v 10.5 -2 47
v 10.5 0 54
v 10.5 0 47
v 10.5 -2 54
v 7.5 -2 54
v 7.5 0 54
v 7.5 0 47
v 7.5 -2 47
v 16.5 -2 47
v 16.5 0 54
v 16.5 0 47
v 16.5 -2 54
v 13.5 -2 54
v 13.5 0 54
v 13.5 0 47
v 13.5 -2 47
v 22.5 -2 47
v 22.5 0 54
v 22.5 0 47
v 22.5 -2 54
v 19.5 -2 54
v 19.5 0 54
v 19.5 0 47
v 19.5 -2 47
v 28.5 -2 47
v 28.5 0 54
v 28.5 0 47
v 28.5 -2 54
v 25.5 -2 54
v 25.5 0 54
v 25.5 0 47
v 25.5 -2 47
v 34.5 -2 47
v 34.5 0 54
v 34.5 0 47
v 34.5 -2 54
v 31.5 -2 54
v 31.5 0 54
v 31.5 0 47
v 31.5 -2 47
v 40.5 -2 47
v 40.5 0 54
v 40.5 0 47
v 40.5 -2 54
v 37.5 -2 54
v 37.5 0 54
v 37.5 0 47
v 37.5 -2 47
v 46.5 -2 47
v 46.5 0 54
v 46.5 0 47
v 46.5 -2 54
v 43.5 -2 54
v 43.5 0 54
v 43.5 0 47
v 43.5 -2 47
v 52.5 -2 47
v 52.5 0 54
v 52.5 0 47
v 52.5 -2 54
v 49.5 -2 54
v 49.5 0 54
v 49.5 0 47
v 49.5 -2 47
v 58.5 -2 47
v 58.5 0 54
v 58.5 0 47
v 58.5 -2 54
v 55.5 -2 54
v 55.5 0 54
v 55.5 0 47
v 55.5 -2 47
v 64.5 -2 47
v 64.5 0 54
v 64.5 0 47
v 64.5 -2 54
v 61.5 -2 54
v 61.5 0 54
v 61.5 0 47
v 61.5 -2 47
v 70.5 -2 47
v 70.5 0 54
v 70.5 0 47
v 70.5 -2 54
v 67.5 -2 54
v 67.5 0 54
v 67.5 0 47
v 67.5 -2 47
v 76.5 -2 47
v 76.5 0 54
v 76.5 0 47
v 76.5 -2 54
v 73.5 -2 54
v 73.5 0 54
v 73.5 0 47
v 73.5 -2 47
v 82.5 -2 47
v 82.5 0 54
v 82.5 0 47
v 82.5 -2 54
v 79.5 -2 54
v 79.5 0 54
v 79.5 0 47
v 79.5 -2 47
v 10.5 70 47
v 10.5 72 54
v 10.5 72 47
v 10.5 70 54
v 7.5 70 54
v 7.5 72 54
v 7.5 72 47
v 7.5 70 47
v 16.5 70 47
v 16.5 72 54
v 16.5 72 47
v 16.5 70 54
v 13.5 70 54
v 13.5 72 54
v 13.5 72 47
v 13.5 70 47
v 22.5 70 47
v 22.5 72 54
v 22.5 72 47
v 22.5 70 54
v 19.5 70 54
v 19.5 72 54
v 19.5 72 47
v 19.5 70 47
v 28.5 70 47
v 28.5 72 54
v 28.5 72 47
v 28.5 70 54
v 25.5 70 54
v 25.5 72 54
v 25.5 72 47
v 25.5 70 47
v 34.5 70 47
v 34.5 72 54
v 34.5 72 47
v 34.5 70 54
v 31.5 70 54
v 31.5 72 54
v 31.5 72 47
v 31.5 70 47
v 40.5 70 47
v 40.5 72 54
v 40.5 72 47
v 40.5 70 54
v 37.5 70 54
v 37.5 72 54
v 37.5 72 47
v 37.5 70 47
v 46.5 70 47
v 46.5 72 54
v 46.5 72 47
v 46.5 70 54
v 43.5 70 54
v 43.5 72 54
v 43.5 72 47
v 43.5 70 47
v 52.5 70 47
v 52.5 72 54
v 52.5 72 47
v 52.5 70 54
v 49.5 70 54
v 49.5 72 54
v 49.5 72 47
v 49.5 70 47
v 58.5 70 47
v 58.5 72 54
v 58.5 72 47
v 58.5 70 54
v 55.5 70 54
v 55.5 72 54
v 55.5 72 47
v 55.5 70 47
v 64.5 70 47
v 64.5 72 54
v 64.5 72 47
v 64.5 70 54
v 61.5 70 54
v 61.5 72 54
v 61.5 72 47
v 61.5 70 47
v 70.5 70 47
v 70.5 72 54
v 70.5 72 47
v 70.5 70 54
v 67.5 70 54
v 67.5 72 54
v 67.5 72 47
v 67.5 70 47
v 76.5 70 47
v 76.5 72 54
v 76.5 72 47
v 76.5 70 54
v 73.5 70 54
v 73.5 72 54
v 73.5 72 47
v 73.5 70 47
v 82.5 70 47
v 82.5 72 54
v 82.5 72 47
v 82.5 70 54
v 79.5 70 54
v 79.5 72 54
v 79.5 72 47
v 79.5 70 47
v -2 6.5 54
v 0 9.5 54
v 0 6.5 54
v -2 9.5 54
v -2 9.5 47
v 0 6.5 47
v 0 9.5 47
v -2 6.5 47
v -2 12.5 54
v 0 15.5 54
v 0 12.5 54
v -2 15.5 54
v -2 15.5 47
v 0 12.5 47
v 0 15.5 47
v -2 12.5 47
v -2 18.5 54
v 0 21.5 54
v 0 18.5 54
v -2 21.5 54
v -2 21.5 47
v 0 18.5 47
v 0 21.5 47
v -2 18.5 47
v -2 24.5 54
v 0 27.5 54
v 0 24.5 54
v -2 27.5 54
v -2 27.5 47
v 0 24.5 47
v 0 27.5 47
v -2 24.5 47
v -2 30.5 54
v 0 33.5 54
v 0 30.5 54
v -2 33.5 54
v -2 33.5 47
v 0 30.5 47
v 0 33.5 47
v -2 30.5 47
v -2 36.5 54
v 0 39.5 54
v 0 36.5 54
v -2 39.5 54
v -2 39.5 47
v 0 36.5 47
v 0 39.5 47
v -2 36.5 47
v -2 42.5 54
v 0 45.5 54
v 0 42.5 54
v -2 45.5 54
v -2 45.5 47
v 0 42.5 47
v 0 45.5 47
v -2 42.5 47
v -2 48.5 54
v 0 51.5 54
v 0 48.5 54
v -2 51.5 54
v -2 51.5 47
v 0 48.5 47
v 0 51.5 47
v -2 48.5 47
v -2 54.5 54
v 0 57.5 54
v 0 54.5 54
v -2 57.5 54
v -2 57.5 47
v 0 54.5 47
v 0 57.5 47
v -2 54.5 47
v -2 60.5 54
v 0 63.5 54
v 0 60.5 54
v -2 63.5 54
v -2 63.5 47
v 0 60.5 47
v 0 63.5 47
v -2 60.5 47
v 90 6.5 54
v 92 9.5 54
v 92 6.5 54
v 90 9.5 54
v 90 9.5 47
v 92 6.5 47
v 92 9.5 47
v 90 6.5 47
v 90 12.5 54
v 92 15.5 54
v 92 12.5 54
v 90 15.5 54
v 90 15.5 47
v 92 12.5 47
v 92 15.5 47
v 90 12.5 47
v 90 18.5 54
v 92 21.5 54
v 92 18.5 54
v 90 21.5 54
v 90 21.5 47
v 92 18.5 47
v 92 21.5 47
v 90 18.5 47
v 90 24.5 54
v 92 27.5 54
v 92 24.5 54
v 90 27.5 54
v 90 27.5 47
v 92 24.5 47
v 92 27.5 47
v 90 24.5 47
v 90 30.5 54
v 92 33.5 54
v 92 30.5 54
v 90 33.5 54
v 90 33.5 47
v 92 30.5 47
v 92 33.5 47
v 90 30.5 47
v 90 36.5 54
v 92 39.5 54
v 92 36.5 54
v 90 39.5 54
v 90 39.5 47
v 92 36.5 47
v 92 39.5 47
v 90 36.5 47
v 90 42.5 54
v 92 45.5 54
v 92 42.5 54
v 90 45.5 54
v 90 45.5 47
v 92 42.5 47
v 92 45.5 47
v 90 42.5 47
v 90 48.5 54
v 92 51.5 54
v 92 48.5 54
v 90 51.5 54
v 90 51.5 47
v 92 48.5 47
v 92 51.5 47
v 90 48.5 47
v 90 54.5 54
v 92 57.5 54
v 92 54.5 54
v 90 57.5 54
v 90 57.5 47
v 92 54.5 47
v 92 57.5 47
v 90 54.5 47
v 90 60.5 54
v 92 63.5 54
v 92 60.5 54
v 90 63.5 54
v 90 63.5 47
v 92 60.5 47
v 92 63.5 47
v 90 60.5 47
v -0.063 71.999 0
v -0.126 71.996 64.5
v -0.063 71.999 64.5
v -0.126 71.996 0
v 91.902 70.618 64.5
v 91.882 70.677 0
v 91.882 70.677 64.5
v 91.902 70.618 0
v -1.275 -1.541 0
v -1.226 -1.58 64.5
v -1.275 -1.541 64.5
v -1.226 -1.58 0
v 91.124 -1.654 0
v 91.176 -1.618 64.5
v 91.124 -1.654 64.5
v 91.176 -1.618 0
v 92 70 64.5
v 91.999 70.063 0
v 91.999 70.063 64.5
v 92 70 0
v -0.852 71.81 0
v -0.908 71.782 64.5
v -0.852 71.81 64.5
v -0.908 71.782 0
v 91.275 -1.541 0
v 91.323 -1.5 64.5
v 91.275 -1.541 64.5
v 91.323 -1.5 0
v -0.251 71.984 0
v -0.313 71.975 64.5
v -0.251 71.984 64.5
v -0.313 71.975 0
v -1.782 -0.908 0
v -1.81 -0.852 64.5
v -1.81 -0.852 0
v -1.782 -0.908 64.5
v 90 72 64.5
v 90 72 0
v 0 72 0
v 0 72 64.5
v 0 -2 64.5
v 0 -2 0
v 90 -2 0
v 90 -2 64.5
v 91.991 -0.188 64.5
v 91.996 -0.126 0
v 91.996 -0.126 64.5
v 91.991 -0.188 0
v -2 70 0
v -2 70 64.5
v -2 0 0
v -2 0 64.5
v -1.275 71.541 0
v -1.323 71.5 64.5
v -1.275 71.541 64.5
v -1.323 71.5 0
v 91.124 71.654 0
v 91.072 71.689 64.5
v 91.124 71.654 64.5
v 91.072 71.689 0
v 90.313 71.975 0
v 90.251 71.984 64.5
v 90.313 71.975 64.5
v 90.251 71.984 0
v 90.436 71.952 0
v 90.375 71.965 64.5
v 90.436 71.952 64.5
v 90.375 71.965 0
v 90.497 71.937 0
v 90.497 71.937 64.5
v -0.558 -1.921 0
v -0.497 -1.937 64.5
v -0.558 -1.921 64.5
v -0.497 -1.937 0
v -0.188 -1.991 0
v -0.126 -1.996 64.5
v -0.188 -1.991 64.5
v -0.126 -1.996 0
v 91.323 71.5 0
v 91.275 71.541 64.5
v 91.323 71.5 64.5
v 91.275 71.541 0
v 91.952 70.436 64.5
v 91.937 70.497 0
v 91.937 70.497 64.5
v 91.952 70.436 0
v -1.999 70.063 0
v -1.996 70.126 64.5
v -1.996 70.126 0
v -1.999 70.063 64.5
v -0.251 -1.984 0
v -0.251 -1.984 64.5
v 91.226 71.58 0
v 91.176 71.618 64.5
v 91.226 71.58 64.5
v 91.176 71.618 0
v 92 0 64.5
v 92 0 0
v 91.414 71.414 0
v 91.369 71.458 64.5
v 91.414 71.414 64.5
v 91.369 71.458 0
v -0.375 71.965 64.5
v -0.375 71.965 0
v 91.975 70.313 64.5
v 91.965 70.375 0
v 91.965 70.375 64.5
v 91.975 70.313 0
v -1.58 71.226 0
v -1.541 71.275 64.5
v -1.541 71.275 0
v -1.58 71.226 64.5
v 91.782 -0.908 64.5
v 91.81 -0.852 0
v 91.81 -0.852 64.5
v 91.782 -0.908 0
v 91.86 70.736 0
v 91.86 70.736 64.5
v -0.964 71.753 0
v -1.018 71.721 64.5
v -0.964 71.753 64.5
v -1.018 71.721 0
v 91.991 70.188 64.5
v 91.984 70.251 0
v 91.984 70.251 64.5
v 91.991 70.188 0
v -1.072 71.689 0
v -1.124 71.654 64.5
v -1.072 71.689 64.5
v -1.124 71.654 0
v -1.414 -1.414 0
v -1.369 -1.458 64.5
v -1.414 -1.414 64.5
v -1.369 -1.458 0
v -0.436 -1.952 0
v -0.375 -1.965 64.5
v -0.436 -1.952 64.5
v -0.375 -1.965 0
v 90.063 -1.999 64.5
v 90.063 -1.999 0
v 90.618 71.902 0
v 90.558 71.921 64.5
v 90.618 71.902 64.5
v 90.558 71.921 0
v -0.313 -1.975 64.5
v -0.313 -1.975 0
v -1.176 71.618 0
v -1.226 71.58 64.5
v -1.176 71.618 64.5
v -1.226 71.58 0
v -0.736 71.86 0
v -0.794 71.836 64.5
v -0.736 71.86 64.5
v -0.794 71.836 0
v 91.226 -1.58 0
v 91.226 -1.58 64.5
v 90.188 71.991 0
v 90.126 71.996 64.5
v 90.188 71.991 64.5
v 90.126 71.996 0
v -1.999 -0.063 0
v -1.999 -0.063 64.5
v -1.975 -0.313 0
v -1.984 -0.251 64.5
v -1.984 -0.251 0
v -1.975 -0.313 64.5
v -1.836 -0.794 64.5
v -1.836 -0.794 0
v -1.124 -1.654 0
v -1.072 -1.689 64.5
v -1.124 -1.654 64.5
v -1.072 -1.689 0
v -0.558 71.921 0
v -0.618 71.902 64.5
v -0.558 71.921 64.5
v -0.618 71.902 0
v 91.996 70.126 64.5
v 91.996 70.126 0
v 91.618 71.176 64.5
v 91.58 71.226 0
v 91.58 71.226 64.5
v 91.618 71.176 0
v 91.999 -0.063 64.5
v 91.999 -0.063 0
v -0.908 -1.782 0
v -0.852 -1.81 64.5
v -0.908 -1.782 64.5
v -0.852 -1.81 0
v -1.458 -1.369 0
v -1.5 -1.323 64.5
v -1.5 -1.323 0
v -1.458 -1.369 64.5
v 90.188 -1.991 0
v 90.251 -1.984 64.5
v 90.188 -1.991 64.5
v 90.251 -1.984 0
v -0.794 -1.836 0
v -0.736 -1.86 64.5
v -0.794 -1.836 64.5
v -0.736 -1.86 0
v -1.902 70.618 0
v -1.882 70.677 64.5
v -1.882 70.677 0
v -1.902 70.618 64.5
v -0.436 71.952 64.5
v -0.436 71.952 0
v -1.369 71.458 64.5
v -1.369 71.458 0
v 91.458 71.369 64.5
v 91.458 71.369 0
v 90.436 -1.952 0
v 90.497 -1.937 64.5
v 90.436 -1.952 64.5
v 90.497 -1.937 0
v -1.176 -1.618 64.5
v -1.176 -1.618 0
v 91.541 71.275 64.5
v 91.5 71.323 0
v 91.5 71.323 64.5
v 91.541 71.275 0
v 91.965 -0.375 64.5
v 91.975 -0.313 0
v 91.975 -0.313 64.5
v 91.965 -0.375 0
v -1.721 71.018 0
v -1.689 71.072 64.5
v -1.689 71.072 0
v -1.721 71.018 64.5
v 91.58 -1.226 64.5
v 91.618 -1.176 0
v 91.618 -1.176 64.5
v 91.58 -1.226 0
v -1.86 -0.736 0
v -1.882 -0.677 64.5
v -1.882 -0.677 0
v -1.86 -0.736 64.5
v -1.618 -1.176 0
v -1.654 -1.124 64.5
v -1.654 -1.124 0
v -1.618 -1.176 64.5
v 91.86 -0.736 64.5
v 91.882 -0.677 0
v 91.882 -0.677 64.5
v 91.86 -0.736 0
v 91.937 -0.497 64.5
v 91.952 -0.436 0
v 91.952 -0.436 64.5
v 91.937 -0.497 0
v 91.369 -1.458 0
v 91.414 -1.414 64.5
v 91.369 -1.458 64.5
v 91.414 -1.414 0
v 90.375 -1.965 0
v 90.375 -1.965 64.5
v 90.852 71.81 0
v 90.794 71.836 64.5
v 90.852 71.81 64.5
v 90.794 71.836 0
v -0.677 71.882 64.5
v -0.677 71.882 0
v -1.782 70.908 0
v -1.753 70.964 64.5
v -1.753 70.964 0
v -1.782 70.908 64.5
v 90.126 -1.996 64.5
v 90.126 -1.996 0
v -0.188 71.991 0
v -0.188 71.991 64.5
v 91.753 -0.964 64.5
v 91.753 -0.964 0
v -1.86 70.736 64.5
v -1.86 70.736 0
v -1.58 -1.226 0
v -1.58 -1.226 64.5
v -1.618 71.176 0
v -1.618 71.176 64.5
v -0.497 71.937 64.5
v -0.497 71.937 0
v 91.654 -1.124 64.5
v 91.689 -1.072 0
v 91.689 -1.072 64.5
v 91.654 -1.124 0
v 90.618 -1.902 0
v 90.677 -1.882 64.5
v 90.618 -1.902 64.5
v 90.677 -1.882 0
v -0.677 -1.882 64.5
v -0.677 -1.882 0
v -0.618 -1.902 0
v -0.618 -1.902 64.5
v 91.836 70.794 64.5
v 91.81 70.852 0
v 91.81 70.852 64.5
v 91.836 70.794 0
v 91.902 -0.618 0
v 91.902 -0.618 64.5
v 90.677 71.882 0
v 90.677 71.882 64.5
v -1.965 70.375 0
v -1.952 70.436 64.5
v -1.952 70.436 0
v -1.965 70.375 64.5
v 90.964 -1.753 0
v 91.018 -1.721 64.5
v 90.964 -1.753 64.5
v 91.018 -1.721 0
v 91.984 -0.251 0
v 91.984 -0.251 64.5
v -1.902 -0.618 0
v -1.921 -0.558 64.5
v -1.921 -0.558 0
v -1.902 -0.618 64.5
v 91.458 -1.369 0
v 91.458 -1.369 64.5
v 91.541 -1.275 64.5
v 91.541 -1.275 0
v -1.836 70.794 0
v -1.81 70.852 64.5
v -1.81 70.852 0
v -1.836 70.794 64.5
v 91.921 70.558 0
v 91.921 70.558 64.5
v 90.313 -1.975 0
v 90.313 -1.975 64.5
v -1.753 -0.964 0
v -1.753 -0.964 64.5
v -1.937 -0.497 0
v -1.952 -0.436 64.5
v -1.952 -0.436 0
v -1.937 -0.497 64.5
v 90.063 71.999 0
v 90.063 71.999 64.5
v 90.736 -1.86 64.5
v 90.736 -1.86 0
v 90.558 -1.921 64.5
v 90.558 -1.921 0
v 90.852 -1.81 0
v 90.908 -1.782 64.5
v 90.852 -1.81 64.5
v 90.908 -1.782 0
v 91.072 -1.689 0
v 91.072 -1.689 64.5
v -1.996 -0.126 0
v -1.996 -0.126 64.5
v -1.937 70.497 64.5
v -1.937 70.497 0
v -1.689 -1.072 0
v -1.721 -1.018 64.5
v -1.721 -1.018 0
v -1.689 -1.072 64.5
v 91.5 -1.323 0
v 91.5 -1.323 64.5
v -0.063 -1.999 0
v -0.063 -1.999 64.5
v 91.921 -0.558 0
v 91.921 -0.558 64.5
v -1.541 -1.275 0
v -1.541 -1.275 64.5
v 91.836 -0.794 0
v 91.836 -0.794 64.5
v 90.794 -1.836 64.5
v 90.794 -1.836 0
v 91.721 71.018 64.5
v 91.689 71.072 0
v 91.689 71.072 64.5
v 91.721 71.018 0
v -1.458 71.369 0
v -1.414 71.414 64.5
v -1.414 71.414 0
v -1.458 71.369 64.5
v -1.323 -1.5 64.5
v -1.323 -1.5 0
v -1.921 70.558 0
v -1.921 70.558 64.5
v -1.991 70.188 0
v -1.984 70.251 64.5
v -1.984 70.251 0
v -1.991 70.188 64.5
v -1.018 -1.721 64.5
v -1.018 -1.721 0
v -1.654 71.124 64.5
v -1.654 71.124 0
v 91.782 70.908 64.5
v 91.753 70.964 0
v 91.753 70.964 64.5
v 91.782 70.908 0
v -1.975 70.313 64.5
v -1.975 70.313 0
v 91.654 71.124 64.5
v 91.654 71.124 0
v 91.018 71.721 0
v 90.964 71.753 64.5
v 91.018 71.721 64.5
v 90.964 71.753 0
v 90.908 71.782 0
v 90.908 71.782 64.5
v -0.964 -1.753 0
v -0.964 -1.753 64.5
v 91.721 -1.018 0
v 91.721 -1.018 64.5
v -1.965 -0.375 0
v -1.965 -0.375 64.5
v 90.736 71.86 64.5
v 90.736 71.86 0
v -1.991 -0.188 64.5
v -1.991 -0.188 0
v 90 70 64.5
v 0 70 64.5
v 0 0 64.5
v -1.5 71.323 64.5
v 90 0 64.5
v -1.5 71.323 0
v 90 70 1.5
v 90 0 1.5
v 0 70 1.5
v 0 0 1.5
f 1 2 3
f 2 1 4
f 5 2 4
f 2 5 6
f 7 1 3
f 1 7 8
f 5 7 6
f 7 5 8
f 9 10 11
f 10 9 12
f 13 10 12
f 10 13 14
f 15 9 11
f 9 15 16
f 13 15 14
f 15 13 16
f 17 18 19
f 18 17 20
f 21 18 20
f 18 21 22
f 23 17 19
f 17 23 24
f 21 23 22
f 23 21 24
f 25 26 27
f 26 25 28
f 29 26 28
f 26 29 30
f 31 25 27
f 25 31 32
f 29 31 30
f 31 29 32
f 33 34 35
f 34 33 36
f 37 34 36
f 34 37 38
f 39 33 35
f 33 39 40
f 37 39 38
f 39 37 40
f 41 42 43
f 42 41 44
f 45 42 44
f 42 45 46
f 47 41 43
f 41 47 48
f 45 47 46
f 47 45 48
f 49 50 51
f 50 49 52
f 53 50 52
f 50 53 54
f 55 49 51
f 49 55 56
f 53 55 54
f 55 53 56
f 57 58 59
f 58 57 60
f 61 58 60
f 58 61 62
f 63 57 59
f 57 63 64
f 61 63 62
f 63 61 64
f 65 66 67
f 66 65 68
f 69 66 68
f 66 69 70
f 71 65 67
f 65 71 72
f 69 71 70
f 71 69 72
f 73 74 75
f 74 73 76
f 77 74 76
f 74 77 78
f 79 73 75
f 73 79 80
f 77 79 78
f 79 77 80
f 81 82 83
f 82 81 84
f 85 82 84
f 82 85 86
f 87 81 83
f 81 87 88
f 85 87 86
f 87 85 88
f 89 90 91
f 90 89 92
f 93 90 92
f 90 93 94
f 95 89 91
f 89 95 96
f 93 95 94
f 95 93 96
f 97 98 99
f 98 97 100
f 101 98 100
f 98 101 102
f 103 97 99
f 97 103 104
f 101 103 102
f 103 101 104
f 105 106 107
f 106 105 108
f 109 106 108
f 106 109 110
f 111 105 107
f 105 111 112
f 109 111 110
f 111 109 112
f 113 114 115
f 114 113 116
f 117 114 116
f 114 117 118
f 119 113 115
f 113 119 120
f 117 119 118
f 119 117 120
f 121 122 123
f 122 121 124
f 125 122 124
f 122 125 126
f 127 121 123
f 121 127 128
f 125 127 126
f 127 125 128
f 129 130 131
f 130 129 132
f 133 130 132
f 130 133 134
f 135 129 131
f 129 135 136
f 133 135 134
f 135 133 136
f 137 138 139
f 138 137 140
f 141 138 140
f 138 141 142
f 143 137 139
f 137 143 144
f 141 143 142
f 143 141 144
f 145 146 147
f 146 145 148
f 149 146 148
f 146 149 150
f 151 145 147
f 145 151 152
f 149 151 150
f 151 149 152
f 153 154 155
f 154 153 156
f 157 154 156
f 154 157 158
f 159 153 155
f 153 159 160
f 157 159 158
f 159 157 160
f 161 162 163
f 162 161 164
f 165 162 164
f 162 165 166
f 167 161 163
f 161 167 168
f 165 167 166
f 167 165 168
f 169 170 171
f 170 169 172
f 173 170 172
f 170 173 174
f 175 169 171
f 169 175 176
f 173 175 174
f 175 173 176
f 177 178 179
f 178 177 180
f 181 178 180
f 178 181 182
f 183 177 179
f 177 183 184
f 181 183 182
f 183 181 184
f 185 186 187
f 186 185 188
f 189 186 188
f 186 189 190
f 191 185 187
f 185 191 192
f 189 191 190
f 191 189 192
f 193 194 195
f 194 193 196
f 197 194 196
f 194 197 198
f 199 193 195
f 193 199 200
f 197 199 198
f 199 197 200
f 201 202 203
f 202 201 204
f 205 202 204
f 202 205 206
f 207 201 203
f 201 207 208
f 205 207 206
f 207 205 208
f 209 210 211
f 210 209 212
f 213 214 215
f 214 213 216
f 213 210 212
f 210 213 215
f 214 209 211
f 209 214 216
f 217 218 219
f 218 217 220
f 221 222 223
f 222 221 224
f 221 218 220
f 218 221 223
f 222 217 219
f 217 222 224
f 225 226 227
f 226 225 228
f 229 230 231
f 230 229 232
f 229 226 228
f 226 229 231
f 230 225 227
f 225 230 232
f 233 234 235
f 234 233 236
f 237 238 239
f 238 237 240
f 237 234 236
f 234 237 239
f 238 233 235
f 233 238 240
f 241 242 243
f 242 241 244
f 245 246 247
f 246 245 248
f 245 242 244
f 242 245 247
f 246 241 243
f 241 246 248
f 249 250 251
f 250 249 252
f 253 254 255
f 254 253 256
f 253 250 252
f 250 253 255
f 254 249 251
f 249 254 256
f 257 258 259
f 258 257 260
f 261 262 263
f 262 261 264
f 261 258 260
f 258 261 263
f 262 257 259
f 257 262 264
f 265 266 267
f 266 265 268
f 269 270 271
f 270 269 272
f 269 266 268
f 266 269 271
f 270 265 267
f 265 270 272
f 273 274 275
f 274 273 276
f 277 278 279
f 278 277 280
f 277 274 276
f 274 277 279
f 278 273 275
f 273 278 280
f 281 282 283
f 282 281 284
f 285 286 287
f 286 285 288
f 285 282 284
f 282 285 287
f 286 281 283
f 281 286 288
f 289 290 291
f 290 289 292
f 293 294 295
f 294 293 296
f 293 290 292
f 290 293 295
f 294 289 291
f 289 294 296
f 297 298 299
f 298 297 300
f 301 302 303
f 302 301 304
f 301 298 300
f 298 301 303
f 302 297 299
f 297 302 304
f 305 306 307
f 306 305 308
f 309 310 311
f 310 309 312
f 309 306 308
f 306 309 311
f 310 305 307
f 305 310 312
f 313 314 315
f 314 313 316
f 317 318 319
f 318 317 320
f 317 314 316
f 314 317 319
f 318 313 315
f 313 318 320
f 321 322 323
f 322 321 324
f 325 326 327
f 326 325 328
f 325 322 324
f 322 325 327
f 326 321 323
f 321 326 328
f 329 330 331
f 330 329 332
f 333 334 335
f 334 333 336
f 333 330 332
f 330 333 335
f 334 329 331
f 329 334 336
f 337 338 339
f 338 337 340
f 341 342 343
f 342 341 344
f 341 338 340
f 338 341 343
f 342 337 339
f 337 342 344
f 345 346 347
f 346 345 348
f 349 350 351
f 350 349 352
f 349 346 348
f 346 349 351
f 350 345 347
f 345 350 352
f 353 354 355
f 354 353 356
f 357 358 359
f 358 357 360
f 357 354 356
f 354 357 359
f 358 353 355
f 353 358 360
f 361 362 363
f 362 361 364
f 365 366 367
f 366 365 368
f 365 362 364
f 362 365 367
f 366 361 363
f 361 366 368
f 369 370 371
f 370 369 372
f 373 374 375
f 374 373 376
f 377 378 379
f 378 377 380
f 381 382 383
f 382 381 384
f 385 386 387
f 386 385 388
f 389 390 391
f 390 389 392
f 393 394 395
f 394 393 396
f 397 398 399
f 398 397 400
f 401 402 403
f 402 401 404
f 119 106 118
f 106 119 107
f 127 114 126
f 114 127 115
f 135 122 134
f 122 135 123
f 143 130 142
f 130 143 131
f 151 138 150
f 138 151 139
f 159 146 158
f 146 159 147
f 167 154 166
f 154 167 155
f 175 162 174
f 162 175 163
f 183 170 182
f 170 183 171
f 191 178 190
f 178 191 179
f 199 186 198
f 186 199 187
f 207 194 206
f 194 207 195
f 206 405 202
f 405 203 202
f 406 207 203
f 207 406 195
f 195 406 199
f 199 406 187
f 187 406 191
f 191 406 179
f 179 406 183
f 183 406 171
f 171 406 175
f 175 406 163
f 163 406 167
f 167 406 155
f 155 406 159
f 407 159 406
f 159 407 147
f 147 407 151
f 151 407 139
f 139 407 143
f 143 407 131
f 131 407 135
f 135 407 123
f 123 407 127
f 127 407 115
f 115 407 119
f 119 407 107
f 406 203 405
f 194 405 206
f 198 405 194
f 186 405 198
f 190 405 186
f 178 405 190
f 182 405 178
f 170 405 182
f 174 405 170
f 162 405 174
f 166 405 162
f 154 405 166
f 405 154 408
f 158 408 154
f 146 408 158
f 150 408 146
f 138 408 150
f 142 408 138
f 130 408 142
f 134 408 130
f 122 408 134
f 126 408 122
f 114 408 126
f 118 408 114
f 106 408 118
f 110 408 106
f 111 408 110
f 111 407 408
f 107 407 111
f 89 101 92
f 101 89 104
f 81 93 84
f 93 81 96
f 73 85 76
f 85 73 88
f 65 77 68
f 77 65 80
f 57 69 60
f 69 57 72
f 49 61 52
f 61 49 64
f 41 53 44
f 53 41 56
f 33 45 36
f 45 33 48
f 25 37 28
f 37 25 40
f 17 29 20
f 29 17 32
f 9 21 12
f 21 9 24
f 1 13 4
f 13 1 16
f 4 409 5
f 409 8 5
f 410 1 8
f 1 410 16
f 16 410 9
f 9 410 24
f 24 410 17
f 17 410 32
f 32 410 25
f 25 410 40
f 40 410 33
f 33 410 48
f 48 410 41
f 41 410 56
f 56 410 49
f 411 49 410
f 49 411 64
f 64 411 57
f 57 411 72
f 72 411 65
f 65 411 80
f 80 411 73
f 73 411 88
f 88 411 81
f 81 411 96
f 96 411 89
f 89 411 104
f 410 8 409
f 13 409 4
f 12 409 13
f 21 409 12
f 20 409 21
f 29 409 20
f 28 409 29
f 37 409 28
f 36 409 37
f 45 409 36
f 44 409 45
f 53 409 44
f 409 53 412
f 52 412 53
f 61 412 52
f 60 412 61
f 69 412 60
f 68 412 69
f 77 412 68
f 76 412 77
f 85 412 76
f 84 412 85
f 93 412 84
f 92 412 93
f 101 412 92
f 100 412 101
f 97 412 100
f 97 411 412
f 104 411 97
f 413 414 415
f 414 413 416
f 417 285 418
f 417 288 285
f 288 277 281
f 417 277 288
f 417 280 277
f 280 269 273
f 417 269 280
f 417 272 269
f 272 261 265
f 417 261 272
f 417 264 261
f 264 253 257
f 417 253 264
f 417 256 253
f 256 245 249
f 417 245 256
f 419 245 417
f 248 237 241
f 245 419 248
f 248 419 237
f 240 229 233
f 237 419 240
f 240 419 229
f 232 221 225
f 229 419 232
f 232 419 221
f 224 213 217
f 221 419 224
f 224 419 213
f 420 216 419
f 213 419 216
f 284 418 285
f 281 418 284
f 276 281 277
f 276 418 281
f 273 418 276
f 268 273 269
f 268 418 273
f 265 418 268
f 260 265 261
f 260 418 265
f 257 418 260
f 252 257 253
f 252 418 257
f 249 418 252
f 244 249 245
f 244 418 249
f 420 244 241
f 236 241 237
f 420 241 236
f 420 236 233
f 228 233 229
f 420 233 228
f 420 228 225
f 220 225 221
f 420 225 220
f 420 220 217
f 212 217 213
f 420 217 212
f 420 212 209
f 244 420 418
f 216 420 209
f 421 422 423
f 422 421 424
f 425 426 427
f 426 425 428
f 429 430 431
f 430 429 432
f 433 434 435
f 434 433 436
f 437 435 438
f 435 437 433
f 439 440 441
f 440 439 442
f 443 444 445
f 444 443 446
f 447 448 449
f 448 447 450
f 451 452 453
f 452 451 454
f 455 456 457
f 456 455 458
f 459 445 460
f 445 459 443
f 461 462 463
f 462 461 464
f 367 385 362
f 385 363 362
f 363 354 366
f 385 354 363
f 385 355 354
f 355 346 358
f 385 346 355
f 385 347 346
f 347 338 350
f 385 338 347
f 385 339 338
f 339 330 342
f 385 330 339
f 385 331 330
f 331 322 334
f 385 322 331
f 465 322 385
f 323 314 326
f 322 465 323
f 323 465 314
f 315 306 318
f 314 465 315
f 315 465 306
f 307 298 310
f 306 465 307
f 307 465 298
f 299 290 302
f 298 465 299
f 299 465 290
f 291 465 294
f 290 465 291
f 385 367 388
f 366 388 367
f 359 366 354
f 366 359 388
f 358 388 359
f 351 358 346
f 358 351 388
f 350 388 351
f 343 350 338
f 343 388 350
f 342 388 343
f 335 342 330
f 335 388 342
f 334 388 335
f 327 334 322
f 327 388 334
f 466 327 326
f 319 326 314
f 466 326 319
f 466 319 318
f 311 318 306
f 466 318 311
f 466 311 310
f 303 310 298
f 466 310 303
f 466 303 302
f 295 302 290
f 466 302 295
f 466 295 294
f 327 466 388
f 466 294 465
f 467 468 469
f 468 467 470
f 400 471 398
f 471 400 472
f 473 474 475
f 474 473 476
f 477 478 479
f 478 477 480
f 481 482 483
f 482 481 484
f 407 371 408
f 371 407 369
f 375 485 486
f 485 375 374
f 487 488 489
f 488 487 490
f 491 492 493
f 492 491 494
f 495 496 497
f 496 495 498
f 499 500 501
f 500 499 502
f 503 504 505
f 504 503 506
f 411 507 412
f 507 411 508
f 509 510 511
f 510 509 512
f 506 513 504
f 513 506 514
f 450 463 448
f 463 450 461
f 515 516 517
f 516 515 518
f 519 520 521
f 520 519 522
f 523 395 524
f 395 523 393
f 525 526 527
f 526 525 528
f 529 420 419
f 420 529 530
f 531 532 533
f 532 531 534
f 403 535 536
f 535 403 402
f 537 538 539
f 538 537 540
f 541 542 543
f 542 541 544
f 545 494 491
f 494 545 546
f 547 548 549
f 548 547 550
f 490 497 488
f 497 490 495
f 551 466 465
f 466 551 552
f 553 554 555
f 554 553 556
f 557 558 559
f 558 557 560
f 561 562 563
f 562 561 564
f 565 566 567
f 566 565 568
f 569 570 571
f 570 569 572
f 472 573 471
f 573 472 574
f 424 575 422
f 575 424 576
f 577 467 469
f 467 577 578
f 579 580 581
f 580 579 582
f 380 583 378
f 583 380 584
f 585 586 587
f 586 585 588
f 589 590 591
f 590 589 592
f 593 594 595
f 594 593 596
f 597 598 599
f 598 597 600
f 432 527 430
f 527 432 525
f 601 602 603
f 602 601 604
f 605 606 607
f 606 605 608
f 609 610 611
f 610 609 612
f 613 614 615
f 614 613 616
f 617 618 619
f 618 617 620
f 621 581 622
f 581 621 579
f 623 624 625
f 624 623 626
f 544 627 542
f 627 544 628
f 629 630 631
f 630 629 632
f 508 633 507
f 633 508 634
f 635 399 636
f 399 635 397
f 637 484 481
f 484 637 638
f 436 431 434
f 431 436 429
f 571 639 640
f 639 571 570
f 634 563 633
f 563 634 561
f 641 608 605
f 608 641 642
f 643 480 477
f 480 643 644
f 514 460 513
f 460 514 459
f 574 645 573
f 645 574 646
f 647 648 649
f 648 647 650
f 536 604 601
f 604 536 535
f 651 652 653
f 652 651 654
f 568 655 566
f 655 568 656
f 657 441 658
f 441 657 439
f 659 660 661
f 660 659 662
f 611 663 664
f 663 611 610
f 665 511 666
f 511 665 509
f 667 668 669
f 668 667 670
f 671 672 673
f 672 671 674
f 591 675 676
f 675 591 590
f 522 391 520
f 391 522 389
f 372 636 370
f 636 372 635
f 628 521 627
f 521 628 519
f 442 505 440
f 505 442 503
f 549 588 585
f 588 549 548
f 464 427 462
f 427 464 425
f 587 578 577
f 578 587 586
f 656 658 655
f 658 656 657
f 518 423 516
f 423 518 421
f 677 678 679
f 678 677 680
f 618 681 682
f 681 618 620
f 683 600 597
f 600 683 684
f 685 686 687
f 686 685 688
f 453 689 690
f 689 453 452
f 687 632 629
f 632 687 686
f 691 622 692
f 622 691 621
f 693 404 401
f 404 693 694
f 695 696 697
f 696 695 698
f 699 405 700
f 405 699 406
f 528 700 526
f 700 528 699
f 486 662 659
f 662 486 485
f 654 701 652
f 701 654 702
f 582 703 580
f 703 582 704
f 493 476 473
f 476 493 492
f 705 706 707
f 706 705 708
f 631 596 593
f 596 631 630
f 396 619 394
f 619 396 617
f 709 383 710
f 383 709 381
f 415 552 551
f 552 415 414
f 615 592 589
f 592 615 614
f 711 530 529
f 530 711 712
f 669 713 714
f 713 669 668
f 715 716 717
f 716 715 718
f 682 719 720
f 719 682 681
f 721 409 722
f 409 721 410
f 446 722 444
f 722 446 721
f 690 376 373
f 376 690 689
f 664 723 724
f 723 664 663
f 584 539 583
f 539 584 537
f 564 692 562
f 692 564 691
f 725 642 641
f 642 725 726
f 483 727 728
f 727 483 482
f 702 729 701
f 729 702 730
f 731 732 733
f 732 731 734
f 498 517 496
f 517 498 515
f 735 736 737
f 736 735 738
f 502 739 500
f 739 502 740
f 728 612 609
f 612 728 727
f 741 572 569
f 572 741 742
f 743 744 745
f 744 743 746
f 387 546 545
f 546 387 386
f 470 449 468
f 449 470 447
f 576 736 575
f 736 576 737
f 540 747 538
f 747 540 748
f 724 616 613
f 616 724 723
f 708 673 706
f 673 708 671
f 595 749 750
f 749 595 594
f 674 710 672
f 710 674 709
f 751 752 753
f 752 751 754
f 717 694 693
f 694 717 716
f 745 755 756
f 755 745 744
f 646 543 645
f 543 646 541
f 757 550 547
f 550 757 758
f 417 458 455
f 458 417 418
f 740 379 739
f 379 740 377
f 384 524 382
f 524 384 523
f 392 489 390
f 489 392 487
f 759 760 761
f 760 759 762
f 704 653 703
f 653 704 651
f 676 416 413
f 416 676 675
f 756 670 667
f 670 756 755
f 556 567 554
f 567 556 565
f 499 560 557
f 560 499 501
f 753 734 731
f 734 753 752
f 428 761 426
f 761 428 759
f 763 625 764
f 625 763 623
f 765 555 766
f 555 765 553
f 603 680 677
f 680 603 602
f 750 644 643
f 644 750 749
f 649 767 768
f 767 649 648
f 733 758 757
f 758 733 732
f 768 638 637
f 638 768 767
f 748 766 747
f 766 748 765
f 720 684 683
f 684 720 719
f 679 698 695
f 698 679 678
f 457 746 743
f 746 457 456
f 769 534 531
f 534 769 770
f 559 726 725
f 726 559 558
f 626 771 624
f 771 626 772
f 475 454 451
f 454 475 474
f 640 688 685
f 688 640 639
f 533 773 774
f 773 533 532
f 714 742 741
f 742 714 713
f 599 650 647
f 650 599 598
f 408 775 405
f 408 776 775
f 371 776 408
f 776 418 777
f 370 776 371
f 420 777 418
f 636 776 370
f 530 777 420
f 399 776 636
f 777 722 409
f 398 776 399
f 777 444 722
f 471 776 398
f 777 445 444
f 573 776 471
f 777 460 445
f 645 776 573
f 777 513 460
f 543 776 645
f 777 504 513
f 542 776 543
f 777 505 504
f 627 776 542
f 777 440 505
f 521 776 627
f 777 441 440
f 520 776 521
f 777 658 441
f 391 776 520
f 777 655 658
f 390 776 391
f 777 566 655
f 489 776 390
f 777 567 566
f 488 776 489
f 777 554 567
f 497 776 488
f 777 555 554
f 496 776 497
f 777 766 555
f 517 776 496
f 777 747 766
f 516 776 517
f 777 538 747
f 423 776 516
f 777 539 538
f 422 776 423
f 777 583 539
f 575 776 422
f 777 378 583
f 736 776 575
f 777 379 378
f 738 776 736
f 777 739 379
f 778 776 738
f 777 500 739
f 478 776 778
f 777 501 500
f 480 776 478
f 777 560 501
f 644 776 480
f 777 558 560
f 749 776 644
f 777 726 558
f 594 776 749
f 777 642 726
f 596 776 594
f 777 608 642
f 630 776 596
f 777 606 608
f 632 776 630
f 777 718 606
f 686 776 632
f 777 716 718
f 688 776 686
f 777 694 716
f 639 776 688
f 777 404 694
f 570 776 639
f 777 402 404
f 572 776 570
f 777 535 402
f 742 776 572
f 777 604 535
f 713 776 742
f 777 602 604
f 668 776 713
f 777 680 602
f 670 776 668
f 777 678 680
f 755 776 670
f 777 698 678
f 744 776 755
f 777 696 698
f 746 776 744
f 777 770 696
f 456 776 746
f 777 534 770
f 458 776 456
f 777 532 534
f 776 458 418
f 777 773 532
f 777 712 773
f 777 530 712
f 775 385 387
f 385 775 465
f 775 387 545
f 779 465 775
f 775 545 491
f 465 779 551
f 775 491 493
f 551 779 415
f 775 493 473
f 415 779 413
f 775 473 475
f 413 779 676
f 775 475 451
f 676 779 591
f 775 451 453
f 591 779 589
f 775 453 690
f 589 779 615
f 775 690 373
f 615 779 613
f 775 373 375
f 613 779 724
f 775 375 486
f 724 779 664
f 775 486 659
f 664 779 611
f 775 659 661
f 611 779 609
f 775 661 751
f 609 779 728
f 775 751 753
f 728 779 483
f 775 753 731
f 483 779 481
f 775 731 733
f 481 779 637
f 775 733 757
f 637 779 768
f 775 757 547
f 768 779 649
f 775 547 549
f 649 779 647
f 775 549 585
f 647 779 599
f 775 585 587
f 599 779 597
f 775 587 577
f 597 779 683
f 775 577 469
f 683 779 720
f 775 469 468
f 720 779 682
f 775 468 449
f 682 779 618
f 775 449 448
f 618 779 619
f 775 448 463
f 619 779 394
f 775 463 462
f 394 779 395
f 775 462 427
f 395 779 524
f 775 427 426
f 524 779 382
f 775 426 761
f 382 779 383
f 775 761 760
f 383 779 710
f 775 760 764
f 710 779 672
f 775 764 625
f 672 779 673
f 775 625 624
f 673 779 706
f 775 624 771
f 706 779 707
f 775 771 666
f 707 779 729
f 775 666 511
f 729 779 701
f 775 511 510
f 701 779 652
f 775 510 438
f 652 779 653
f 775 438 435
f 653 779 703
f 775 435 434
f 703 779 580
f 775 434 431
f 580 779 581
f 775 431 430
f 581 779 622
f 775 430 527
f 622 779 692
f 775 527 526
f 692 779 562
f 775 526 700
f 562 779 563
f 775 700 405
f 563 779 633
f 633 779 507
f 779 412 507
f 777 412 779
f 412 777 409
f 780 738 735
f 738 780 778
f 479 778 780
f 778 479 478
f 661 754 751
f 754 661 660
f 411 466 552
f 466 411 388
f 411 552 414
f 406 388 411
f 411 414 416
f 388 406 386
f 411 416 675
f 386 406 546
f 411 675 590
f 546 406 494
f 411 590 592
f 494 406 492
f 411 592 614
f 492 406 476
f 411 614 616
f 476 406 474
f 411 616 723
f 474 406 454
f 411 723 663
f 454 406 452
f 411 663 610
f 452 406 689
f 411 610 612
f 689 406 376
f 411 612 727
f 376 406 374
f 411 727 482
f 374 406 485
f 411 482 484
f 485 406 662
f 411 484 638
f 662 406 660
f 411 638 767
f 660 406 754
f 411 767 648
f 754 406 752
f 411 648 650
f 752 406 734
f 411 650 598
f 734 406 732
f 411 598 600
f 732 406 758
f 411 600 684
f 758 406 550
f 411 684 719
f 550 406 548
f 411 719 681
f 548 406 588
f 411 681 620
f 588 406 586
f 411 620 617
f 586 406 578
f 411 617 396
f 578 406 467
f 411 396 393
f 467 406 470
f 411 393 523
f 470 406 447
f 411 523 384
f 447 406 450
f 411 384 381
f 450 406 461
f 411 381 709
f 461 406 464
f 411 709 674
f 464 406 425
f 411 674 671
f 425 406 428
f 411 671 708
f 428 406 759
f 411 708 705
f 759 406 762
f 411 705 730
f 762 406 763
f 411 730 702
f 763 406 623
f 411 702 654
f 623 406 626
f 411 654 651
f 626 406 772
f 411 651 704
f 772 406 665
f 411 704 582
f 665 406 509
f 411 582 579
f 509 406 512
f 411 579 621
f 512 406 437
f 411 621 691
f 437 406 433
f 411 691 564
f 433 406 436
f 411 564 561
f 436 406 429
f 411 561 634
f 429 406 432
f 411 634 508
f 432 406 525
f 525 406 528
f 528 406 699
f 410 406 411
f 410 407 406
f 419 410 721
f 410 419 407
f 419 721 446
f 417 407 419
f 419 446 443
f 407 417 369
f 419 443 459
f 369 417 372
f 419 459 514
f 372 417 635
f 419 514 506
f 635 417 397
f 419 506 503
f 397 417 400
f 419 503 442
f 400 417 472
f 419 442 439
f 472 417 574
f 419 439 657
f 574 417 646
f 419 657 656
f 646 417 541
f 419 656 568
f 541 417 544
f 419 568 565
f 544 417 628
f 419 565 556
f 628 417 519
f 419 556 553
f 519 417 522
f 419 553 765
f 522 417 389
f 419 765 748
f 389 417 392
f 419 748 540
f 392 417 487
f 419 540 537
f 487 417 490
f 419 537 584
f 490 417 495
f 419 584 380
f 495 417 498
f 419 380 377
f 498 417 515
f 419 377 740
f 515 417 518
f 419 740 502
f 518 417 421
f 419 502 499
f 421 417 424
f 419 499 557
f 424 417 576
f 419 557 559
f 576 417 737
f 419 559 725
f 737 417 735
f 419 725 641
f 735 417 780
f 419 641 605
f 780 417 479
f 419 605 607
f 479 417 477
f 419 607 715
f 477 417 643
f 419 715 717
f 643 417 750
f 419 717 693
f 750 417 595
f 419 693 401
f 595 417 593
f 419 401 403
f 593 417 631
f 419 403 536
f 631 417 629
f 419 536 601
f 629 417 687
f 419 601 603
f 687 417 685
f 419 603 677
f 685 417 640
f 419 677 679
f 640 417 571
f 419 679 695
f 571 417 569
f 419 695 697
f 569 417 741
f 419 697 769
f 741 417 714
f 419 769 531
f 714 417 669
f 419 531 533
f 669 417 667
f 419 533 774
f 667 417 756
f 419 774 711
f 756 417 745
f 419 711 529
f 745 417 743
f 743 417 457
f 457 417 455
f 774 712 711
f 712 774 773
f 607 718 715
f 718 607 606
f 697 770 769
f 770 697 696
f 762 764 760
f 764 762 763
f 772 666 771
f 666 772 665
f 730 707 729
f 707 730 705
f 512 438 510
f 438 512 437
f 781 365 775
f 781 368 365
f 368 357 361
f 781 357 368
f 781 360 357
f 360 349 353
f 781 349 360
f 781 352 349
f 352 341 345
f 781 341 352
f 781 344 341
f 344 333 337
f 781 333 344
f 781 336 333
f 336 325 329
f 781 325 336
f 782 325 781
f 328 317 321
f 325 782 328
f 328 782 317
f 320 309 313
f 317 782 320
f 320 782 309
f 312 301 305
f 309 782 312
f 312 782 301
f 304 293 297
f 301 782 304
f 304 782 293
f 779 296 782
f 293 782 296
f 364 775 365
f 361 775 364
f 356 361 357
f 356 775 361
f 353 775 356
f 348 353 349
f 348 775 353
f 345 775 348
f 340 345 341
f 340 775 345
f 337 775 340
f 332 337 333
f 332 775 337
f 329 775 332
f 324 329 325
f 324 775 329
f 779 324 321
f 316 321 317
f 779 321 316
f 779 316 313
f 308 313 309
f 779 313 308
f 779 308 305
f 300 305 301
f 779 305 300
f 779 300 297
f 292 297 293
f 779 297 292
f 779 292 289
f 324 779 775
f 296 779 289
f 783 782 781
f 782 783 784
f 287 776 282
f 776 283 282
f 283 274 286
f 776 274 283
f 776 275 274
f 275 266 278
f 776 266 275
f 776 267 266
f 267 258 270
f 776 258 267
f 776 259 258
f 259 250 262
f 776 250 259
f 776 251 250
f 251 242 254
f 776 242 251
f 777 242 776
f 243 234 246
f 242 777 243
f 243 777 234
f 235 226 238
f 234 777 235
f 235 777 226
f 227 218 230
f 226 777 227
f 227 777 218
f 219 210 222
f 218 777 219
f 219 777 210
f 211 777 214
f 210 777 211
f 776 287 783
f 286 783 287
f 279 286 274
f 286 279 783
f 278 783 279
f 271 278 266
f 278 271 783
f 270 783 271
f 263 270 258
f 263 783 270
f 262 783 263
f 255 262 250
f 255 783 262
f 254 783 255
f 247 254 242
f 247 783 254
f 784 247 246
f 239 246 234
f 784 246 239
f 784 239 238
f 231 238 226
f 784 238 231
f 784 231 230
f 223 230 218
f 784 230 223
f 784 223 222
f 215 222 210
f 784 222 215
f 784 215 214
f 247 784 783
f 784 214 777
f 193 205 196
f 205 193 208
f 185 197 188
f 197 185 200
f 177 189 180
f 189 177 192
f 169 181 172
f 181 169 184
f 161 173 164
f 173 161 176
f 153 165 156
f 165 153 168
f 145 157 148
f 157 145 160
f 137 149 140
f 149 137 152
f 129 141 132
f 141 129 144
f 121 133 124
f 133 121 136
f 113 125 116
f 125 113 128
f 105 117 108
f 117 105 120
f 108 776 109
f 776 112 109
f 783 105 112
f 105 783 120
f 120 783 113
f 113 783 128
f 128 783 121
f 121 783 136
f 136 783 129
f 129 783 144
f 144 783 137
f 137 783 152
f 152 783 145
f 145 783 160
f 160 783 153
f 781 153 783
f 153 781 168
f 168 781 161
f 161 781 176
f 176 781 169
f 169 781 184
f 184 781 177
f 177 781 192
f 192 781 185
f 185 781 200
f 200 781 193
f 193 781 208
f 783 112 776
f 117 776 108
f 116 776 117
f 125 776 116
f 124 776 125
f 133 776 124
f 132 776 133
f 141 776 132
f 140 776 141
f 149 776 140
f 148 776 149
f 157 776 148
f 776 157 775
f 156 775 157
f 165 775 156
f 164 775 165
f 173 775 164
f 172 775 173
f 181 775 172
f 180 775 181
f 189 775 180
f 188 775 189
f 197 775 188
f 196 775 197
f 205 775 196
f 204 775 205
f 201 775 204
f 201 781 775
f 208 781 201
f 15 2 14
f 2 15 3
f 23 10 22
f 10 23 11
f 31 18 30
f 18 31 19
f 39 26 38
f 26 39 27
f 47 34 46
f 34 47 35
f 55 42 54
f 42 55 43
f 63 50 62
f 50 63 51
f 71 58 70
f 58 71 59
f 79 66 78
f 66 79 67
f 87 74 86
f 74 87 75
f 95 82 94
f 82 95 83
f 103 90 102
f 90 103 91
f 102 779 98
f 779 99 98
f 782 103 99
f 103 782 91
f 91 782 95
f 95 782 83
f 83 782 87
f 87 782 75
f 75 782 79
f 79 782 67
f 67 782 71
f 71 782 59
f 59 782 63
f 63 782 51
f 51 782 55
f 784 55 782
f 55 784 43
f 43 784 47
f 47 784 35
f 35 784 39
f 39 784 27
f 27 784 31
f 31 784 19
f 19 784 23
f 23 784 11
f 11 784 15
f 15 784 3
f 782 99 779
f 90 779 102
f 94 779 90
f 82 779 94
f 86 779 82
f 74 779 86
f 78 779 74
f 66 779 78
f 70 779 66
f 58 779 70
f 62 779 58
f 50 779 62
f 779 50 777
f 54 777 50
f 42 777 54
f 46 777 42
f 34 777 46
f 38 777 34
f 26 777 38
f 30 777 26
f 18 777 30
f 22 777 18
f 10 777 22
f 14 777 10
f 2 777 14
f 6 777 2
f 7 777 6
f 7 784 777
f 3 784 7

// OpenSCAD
$fn=200;

case1();

module case2(){
    difference(){
        cube([89.7,69.7,1.5]);
        
        translate([20,2,0])cube([9,4,1.5]);
    }
}

module case1(){
    difference(){
        minkowski()
        {
          cube([90,70,31.5]);
          cylinder(r=2,h=33);
        }
        
        translate([0,0,1.5])cube([90,70,66]);
        
        translate([7.5,-2.5,0])lines1();
        translate([7.5,69,0])lines1();
        
        translate([-2.5,6.5,0])lines2();
        translate([89,6.5,0])lines2();
    }
}

module lines1(){
    union(){
        translate([0,0,47])cube([3,5,7]);
        translate([6,0,47])cube([3,5,7]);
        translate([12,0,47])cube([3,5,7]);
        translate([18,0,47])cube([3,5,7]);
        translate([24,0,47])cube([3,5,7]);
        translate([30,0,47])cube([3,5,7]);
        translate([36,0,47])cube([3,5,7]);
        translate([42,0,47])cube([3,5,7]);
        translate([48,0,47])cube([3,5,7]);
        translate([54,0,47])cube([3,5,7]);
        translate([60,0,47])cube([3,5,7]);
        translate([66,0,47])cube([3,5,7]);
        translate([72,0,47])cube([3,5,7]);
    }
}

module lines2(){
    union(){
        translate([0,0,47])cube([5,3,7]);
        translate([0,6,47])cube([5,3,7]);
        translate([0,12,47])cube([5,3,7]);
        translate([0,18,47])cube([5,3,7]);
        translate([0,24,47])cube([5,3,7]);
        translate([0,30,47])cube([5,3,7]);
        translate([0,36,47])cube([5,3,7]);
        translate([0,42,47])cube([5,3,7]);
        translate([0,48,47])cube([5,3,7]);
        translate([0,54,47])cube([5,3,7]);
    }
    
}
